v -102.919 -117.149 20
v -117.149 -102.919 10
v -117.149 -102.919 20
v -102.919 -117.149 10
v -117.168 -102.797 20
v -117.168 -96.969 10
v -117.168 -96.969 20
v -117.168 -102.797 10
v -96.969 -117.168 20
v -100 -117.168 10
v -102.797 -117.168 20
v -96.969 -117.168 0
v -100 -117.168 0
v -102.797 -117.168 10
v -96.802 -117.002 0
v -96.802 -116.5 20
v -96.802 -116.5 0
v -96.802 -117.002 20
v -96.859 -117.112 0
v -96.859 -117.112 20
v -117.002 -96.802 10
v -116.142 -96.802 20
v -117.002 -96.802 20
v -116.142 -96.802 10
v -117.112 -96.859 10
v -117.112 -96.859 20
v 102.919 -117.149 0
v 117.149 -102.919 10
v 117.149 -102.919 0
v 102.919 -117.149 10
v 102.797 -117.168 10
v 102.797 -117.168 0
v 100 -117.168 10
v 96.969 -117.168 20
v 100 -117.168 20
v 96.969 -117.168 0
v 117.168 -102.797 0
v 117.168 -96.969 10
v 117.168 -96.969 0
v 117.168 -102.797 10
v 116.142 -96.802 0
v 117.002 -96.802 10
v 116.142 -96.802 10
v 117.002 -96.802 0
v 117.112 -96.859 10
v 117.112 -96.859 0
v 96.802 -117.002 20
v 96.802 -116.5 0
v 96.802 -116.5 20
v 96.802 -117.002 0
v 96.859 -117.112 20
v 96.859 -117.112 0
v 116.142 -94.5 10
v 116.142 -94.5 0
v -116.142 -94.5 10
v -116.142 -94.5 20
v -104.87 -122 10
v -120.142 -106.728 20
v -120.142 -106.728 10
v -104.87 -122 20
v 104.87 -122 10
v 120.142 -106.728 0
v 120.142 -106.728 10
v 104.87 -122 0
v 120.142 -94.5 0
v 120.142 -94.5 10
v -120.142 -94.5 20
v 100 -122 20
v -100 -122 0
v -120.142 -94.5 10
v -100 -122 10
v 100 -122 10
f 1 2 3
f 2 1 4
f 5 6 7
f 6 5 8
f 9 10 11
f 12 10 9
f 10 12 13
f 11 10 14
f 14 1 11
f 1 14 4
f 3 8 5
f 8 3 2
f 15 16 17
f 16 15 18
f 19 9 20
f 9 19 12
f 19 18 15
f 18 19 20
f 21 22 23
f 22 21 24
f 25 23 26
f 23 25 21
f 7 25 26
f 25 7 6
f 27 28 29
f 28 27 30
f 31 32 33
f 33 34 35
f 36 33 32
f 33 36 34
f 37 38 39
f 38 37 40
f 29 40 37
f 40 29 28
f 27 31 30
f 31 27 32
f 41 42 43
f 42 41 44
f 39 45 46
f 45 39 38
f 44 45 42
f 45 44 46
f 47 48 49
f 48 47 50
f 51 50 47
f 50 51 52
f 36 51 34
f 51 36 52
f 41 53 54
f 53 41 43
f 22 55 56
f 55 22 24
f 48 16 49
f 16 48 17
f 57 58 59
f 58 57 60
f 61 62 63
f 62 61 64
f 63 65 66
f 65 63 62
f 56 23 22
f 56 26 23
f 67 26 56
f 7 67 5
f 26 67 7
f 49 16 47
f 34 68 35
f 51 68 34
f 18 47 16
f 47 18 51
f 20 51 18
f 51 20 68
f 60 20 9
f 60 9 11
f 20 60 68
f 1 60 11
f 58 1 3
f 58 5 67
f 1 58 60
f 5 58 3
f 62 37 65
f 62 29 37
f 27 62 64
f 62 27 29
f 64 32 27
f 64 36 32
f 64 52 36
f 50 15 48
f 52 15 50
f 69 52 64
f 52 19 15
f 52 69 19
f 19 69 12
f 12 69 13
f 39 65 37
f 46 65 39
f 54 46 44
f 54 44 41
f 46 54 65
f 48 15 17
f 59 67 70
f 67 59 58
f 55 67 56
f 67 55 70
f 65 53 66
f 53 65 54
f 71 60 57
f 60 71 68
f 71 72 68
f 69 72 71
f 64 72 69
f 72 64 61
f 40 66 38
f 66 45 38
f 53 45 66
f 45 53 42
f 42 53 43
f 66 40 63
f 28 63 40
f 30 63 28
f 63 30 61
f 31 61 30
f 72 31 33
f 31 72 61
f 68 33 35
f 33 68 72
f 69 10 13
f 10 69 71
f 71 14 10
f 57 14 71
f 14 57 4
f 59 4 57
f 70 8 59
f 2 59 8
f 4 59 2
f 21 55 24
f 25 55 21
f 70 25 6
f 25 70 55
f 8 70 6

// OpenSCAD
strip_thickness_mm = 0.5;
strip_width_mm = 8.5;
strip_retention_wall_mm = 1.5;
strip_retention_wall_angle = 40;
strip_separation_mm = 1;
strip_depth_mm = 1;
bracket_width_mm = strip_width_mm * 2 + 3 * strip_separation_mm;
bracket_depth_mm = 4;
mirror_thickness_mm = 1.2;
mirror_retention_depth_mm = 3;
mirror_retention_inset_mm = 1.2;
slot_tolerance_mm = 0.4;
mirror_width_mm = 200;

mirror_retention_block_width_mm = mirror_retention_depth_mm + bracket_depth_mm / sqrt(2);
corner_piece_offset_mm = bracket_width_mm / 2 - bracket_depth_mm / 2 + (mirror_retention_block_width_mm - mirror_retention_depth_mm) * sqrt(2);
corner_piece_inset_mm = 6;
floor_inset_mm = 38;
base_chamfer_height_mm = 12;
top_corner_chamfer_mm = 12;
top_pin_area_mm = 21;
corner_piece_hole_depth_mm = 8;
lid_retention_thickness_mm = 2.5;
floor_size_mm = 201;
ceiling_size_mm = floor_size_mm + 2 * lid_retention_thickness_mm;
top_thickness_mm = corner_piece_hole_depth_mm + 4;

horizontal_bracket_length_mm = 7.625 * 25.4;
horizontal_bracket_retention_width_mm = 6 * 25.4;
horizontal_bracket_retention_wall_thickness_mm = 2.5;
horizontal_bracket_retention_tolerance_mm = 0.3;

pin_width_mm = 10;
pin_depth_mm = 8;
pin_inset_mm = 10;
pin_thickness_mm = 4;
pin_top_thickness_mm = 3;
pin_insertion_easing_mm = 0.6;

pin_insertion_depth_mm = pin_depth_mm - pin_top_thickness_mm;
pin_insertion_tolerance_mm = 0.3;

pin_insertion_extra_mm = 1;

strip_retention_wall_skew_factor = tan(strip_retention_wall_angle);
strip_retention_wall_x_mm = strip_retention_wall_mm * strip_retention_wall_skew_factor;

module profile(height_mm)
{
  translate([0, 0, height_mm * 0.5])
  cube([bracket_width_mm, bracket_depth_mm, height_mm], center = true);

  for (i = [-1, 1])
  {
    scale([-i, 1, 1])
    intersection()
    {
      translate([-bracket_width_mm / 2, 0, 0])
      translate([bracket_depth_mm / sqrt(2) / 2, bracket_depth_mm * (1 - sqrt(2) / 2) / 2, 0.5 * height_mm])
      rotate([0, 0, 45])
      difference()
      {
        translate([-0.5 * mirror_retention_block_width_mm, 0, 0])
        cube([mirror_retention_block_width_mm, bracket_depth_mm, height_mm], center = true);
      }

      union()
      {
        translate([-3.5 * bracket_width_mm, 0, 0])
        cube([6 * bracket_width_mm, 6 * bracket_width_mm, 4 * height_mm], center = true);

        translate([0, -3.5 * bracket_depth_mm, 0])
        cube([4 * bracket_width_mm, 6 * bracket_depth_mm, 4 * height_mm], center = true);
      }
    }
  }
}

base_chamfer_generation_side_mm = mirror_width_mm + corner_piece_offset_mm * sqrt(2) * 2 + corner_piece_inset_mm * 2 + top_thickness_mm * 2;
base_side_mm = mirror_width_mm + corner_piece_offset_mm * sqrt(2) * 2 + corner_piece_inset_mm * 2 + base_chamfer_height_mm * 2;
top_side_mm = mirror_width_mm + corner_piece_offset_mm * sqrt(2) * 2 + corner_piece_inset_mm * 2;

strip_retention_angle = 28;

strip_retention_min_mm = ceiling_size_mm * 0.5;
strip_retention_max_mm = mirror_width_mm * 0.5 + corner_piece_offset_mm * sqrt(2) - bracket_depth_mm + mirror_retention_inset_mm;
strip_retention_width_mm = strip_retention_max_mm - strip_retention_min_mm;

strip_retention_width_flat_mm = strip_retention_width_mm / cos(strip_retention_angle);

clamp_width_mm = mirror_width_mm + 2 * bracket_width_mm / sqrt(2) + 3 * bracket_depth_mm;
clamp_depth_mm = bracket_width_mm + bracket_depth_mm * 2 + 2.5;
clamp_thickness_mm = 10;
clamp_height_mm = 20;

module clamp()
{
  union()
  {
    difference()
    {
      translate([0, -mirror_width_mm / 2 + clamp_depth_mm / 2 - bracket_width_mm - bracket_depth_mm * 0.5 + bracket_depth_mm * 0.5 - 1 - clamp_thickness_mm / 4, clamp_height_mm / 2])
      cube([clamp_width_mm, clamp_depth_mm - bracket_depth_mm * 2 + clamp_thickness_mm / 2, clamp_height_mm], center = true);

      color("red")
      for (i = [1 : 2])
      {
        rotate([0, 0, 45 + 90 * i])
        translate([0, mirror_width_mm / sqrt(2) + corner_piece_offset_mm, 0])
        minkowski()
        {
          profile(100);
          sphere(d = slot_tolerance_mm, $fn = 10);
        }
      }
      
      difference()
      {
        color("green")
        translate([0, -0.5 * mirror_width_mm - (bracket_width_mm / 2 + bracket_depth_mm / 2) + (bracket_width_mm + bracket_depth_mm * 2) - bracket_width_mm, 5])
        cube([mirror_width_mm + bracket_width_mm * sqrt(2) + bracket_depth_mm, bracket_width_mm * 1.25, clamp_height_mm * 2], center = true);

        for (i = [-1, 1])
        {
          rotate([0, 0, 45 * i])
          translate([0, -mirror_width_mm / sqrt(2) - bracket_width_mm - bracket_depth_mm * 3, 4])
          cube([2 * bracket_width_mm, 2 * bracket_width_mm, clamp_height_mm * 3], center = true);
        }
      }
      
      for (i = [-1, 1])
      {
        color("blue")
        rotate([0, 0, 45 * i])
        translate([0, -mirror_width_mm / sqrt(2) - bracket_width_mm - bracket_depth_mm * 3.5 - clamp_thickness_mm / 2, 4])
        cube([2 * bracket_width_mm, 2 * bracket_width_mm, clamp_height_mm * 2], center = true);
      }

      translate([25 + mirror_width_mm / 2, -mirror_width_mm / 2, clamp_height_mm / 2 + 25])
      cube([50, 50, 50], center = true);
      translate([-(25 + mirror_width_mm / 2), -mirror_width_mm / 2, clamp_height_mm / 2 - 25])
      cube([50, 50, 50], center = true);
    }
  }
}

clamp();
